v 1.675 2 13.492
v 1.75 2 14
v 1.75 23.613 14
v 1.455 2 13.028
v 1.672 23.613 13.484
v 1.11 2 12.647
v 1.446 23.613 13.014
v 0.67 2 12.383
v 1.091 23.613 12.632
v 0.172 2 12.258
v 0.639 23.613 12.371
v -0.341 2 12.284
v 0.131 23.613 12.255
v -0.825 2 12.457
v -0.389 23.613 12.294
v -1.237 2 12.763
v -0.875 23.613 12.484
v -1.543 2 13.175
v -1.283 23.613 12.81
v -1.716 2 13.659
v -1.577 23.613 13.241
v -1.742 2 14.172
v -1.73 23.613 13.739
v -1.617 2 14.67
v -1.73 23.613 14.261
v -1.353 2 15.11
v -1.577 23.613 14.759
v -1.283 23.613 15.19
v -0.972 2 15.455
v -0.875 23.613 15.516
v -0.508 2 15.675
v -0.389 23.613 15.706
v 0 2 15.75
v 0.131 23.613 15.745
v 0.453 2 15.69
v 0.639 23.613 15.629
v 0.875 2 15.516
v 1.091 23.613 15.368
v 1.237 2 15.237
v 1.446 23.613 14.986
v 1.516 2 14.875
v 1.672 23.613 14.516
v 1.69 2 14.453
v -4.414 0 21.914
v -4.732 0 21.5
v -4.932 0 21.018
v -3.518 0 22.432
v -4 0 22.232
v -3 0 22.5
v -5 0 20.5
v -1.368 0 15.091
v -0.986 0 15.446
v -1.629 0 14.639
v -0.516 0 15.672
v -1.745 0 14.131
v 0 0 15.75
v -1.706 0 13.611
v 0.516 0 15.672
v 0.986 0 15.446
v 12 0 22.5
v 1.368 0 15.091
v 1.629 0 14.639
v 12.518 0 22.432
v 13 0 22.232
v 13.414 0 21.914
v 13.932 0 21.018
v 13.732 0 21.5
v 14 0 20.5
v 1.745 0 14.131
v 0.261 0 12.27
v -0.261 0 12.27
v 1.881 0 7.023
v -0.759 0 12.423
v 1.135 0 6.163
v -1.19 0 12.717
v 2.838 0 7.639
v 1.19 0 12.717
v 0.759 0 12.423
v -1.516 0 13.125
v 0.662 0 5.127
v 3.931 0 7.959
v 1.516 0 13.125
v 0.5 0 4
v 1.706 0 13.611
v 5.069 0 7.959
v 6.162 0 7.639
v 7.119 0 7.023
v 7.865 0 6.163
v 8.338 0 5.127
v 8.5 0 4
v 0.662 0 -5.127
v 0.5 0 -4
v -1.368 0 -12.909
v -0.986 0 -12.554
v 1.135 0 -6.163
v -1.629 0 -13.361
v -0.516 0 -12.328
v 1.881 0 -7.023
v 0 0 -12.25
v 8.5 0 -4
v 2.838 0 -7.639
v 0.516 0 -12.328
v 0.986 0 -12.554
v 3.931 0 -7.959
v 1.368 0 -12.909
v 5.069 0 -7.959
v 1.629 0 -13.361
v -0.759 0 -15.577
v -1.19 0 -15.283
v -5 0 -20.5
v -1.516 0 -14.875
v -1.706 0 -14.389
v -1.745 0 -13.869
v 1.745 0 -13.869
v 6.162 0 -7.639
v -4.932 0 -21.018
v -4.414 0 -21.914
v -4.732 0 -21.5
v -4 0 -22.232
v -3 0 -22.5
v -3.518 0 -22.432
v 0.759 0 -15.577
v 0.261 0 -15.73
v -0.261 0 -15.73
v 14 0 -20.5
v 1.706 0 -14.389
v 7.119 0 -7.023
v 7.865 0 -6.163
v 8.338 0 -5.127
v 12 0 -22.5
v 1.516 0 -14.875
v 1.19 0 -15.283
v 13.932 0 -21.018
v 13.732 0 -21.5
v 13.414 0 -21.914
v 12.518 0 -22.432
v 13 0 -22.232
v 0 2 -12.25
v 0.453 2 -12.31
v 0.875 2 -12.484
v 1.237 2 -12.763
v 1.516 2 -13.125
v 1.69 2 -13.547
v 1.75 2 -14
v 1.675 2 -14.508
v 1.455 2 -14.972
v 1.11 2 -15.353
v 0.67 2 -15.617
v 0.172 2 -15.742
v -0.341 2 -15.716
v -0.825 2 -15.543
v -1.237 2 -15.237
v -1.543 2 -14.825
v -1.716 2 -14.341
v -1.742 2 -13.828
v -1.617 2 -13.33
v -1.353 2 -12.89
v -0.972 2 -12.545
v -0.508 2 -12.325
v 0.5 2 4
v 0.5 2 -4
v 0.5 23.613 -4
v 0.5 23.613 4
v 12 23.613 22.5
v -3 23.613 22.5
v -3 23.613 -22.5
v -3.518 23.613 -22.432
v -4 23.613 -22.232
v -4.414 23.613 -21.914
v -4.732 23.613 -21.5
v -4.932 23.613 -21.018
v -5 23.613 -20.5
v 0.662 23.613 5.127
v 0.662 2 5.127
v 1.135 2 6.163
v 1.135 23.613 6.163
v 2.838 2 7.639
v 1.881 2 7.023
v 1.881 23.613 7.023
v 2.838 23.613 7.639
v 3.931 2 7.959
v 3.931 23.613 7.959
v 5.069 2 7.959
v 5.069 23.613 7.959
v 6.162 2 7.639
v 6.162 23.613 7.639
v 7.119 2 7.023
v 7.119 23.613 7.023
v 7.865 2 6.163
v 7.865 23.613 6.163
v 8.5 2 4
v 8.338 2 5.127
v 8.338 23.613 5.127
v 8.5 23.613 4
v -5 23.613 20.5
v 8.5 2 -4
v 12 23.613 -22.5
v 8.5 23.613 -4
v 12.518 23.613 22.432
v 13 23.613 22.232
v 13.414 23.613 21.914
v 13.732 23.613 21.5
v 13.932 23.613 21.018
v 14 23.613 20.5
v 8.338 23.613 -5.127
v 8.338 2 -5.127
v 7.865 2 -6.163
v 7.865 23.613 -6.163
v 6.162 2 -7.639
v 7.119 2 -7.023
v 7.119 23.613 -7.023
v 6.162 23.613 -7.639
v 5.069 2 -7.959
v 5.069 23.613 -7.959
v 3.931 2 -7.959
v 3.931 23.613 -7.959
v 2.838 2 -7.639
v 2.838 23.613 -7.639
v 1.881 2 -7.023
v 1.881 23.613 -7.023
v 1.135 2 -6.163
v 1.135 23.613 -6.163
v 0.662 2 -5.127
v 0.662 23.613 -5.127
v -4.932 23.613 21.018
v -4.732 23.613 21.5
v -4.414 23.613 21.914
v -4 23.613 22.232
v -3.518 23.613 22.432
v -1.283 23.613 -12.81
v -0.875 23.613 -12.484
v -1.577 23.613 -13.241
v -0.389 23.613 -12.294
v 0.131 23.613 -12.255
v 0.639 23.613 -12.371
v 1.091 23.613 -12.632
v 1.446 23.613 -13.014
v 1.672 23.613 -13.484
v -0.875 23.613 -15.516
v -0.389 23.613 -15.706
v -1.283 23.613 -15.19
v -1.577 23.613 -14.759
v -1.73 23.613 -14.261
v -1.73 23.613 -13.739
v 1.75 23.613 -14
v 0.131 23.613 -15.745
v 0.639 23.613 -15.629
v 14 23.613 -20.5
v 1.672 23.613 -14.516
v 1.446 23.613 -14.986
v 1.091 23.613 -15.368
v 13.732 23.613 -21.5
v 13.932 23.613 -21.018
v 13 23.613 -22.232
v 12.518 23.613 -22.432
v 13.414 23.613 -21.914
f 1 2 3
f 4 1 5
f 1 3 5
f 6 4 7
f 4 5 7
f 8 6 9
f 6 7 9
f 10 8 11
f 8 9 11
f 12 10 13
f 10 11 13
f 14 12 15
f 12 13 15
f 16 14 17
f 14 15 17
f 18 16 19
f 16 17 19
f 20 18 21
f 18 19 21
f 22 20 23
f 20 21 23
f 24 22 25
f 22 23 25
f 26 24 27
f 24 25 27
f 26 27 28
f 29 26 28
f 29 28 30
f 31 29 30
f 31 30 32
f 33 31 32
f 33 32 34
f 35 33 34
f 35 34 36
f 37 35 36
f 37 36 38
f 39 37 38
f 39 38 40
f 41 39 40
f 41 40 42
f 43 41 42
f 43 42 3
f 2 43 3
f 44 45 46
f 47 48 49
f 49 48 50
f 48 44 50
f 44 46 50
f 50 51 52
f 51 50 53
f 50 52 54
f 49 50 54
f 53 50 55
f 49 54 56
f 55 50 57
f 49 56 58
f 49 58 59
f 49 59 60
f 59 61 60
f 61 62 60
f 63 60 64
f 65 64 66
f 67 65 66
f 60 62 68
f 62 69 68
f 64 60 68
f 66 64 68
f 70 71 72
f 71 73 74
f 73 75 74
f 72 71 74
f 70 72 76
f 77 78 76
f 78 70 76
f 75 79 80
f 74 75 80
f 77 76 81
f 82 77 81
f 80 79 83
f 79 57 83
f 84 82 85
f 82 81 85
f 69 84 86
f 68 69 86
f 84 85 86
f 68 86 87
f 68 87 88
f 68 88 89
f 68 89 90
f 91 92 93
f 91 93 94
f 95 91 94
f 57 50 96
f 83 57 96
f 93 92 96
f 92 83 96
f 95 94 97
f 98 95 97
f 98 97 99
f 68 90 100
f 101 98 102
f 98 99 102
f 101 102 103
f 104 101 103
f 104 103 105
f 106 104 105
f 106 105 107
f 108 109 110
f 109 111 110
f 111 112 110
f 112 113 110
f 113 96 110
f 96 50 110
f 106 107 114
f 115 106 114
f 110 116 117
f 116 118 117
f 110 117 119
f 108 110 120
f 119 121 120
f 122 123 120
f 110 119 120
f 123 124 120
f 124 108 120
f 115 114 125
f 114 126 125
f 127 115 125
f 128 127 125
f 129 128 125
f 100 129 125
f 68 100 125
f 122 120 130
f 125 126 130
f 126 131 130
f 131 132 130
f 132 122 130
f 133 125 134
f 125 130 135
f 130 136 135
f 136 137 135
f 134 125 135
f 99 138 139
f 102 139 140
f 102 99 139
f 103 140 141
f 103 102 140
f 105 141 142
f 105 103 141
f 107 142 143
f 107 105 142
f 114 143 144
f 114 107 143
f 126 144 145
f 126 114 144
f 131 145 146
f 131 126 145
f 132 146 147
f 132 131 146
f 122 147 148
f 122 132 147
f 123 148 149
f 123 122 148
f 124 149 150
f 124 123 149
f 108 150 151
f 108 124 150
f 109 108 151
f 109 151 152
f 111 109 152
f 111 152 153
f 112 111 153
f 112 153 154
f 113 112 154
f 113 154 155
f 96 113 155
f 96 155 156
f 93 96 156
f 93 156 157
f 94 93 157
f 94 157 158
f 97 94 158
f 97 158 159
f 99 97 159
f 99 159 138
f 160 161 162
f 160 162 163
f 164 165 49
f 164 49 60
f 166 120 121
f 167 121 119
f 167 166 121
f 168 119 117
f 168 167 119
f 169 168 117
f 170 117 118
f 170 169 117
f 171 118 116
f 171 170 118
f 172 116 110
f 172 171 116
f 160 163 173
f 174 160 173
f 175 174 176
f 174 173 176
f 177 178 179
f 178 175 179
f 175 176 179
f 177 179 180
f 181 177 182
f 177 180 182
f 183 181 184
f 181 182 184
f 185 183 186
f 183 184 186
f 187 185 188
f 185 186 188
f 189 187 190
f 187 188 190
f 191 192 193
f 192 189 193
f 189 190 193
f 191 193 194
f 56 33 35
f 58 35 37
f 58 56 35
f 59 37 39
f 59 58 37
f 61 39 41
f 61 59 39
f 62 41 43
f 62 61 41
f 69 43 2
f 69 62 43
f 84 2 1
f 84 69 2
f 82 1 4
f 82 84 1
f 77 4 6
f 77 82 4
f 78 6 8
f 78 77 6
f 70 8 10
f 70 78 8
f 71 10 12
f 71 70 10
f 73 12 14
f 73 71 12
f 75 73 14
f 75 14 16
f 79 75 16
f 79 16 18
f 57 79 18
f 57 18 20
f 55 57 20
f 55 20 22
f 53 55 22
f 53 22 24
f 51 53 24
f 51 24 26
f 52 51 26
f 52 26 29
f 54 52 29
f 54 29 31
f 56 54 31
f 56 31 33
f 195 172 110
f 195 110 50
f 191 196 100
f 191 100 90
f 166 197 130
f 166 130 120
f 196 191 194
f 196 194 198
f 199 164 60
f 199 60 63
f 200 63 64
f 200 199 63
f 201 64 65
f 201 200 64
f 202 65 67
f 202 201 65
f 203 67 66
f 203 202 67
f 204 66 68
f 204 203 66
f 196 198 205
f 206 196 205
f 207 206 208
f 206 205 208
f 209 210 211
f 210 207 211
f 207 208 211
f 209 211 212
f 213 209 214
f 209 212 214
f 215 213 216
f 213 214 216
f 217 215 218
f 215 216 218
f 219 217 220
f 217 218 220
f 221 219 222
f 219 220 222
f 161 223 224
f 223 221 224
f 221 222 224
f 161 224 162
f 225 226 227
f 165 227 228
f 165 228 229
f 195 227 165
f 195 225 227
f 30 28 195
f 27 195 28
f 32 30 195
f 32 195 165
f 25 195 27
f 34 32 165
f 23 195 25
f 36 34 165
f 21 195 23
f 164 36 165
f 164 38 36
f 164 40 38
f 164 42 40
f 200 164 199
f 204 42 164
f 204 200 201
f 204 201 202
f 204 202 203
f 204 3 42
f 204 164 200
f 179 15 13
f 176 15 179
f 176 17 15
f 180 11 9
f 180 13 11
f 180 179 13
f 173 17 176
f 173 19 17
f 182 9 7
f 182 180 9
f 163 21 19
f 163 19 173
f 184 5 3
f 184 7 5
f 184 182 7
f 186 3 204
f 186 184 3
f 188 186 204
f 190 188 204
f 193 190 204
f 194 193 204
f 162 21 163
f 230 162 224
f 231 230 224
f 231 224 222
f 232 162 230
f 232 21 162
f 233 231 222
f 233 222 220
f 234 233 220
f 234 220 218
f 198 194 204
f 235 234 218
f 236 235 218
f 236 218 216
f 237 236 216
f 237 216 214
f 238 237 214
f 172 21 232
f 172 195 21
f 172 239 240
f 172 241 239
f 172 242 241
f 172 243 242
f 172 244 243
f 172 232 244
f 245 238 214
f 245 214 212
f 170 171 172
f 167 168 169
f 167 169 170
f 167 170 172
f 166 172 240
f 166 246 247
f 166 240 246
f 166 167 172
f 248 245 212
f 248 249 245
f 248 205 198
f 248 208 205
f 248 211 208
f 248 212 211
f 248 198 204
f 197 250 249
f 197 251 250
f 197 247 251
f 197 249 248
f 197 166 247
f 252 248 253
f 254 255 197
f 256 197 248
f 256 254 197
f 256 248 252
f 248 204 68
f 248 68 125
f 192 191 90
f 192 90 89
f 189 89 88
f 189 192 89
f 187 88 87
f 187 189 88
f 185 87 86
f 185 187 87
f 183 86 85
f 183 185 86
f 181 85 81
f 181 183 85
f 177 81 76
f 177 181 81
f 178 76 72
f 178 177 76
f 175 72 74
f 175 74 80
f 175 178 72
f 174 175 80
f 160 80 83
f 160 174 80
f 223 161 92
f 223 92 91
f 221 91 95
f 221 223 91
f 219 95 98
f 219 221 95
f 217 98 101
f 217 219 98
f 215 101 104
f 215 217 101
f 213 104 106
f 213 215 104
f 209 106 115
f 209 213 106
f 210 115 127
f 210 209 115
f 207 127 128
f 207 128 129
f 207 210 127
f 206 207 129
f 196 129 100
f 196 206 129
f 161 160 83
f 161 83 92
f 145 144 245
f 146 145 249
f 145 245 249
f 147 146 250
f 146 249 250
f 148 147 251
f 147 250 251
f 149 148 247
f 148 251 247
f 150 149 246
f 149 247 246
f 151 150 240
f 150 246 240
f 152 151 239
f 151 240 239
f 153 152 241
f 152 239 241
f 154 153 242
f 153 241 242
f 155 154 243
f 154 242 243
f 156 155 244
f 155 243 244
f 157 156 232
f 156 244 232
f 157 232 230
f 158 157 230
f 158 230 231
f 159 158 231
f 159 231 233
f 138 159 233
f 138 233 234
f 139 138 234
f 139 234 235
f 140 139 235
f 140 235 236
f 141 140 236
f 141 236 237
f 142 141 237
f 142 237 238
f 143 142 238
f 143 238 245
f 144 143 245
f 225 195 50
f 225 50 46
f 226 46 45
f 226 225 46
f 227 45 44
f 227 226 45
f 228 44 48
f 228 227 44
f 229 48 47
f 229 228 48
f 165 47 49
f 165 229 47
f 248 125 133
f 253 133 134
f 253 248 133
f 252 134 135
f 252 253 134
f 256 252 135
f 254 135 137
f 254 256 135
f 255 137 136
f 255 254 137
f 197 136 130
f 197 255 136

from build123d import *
from build123d.topology import SkipClean

# Parameters (mm, degrees)
SKETCH_1_W          = 19
SKETCH_1_H          = 45
SKETCH_1_R          = 1.75
EXTRUDE_1_DEPTH     = 2
FILLET_1_R          = 2
CUT_EXTRUDE_1_DEPTH = 2
EXTRUDE_START       = 21.612698372
SKETCH_4_R          = 1.75
EXTRUDE_2_DEPTH     = 21.612698372


with BuildPart() as part:
    # 草图1 → 凸台-拉伸1 (new body)
    with BuildSketch(Plane(origin=(0, 0, 0), x_dir=(1, 0, 0), z_dir=(0, 1, 0))):
        with Locations((4.5, 0)):
            Rectangle(SKETCH_1_W, SKETCH_1_H)
        with Locations(Location((0, -14, 0), (0, 0, 270))):
            Circle(SKETCH_1_R, mode=Mode.SUBTRACT)
        with Locations(Location((0, 14, 0), (0, 0, 270))):
            Circle(SKETCH_1_R, mode=Mode.SUBTRACT)
    extrude(amount=EXTRUDE_1_DEPTH)

    # 圆角1
    fillet_1_edges = [part.edges().sort_by_distance(p)[0] for p in [
        (-5, 1, -22.5),
        (14, 1, -22.5),
        (14, 1, 22.5),
        (-5, 1, 22.5),
    ]]
    fillet(fillet_1_edges, radius=FILLET_1_R)

    # 草图3 → 切除-拉伸1 (cut)
    with BuildSketch(Plane(origin=(0, 2, 0), x_dir=(1, 0, 0), z_dir=(0, 1, 0))):
        with BuildLine():
            Line((8.5, 4), (8.5, -4))
            ThreePointArc((8.5, -4), (4.5, -8), (0.5, -4))
            Line((0.5, -4), (0.5, 4))
            ThreePointArc((0.5, 4), (4.5, 8), (8.5, 4))
        make_face()
    extrude(amount=-CUT_EXTRUDE_1_DEPTH, mode=Mode.SUBTRACT)

    # 草图4 → 凸台-拉伸2 (add)
    with SkipClean():  # the faces are left unmerged after this step: merging them gives an invalid solid
        with BuildSketch(Plane(origin=(0, 2, 0), x_dir=(1, 0, 0), z_dir=(0, 1, 0)).offset(EXTRUDE_START)):
            with BuildLine():
                Line((12, 22.5), (-3, 22.5))
                ThreePointArc((-3, 22.5), (-4.414213562, 21.914213562), (-5, 20.5))
                Line((-5, 20.5), (-5, -20.5))
                ThreePointArc((-5, -20.5), (-4.414213562, -21.914213562), (-3, -22.5))
                Line((-3, -22.5), (12, -22.5))
                ThreePointArc((12, -22.5), (13.414213562, -21.914213562), (14, -20.5))
                Line((14, -20.5), (14, 20.5))
                ThreePointArc((14, 20.5), (13.414213562, 21.914213562), (12, 22.5))
            make_face()
            with Locations((0, 14)):
                Circle(SKETCH_4_R, mode=Mode.SUBTRACT)
            with Locations((0, -14)):
                Circle(SKETCH_4_R, mode=Mode.SUBTRACT)
            with BuildLine():
                Line((8.5, -4), (8.5, 4))
                ThreePointArc((8.5, 4), (4.5, 8), (0.5, 4))
                Line((0.5, 4), (0.5, -4))
                ThreePointArc((0.5, -4), (4.5, -8), (8.5, -4))
            make_face(mode=Mode.SUBTRACT)
        extrude(amount=-EXTRUDE_2_DEPTH)
    add(part.part.scale(1), mode=Mode.REPLACE)  # the faces are merged on a copy


solid = part.part
